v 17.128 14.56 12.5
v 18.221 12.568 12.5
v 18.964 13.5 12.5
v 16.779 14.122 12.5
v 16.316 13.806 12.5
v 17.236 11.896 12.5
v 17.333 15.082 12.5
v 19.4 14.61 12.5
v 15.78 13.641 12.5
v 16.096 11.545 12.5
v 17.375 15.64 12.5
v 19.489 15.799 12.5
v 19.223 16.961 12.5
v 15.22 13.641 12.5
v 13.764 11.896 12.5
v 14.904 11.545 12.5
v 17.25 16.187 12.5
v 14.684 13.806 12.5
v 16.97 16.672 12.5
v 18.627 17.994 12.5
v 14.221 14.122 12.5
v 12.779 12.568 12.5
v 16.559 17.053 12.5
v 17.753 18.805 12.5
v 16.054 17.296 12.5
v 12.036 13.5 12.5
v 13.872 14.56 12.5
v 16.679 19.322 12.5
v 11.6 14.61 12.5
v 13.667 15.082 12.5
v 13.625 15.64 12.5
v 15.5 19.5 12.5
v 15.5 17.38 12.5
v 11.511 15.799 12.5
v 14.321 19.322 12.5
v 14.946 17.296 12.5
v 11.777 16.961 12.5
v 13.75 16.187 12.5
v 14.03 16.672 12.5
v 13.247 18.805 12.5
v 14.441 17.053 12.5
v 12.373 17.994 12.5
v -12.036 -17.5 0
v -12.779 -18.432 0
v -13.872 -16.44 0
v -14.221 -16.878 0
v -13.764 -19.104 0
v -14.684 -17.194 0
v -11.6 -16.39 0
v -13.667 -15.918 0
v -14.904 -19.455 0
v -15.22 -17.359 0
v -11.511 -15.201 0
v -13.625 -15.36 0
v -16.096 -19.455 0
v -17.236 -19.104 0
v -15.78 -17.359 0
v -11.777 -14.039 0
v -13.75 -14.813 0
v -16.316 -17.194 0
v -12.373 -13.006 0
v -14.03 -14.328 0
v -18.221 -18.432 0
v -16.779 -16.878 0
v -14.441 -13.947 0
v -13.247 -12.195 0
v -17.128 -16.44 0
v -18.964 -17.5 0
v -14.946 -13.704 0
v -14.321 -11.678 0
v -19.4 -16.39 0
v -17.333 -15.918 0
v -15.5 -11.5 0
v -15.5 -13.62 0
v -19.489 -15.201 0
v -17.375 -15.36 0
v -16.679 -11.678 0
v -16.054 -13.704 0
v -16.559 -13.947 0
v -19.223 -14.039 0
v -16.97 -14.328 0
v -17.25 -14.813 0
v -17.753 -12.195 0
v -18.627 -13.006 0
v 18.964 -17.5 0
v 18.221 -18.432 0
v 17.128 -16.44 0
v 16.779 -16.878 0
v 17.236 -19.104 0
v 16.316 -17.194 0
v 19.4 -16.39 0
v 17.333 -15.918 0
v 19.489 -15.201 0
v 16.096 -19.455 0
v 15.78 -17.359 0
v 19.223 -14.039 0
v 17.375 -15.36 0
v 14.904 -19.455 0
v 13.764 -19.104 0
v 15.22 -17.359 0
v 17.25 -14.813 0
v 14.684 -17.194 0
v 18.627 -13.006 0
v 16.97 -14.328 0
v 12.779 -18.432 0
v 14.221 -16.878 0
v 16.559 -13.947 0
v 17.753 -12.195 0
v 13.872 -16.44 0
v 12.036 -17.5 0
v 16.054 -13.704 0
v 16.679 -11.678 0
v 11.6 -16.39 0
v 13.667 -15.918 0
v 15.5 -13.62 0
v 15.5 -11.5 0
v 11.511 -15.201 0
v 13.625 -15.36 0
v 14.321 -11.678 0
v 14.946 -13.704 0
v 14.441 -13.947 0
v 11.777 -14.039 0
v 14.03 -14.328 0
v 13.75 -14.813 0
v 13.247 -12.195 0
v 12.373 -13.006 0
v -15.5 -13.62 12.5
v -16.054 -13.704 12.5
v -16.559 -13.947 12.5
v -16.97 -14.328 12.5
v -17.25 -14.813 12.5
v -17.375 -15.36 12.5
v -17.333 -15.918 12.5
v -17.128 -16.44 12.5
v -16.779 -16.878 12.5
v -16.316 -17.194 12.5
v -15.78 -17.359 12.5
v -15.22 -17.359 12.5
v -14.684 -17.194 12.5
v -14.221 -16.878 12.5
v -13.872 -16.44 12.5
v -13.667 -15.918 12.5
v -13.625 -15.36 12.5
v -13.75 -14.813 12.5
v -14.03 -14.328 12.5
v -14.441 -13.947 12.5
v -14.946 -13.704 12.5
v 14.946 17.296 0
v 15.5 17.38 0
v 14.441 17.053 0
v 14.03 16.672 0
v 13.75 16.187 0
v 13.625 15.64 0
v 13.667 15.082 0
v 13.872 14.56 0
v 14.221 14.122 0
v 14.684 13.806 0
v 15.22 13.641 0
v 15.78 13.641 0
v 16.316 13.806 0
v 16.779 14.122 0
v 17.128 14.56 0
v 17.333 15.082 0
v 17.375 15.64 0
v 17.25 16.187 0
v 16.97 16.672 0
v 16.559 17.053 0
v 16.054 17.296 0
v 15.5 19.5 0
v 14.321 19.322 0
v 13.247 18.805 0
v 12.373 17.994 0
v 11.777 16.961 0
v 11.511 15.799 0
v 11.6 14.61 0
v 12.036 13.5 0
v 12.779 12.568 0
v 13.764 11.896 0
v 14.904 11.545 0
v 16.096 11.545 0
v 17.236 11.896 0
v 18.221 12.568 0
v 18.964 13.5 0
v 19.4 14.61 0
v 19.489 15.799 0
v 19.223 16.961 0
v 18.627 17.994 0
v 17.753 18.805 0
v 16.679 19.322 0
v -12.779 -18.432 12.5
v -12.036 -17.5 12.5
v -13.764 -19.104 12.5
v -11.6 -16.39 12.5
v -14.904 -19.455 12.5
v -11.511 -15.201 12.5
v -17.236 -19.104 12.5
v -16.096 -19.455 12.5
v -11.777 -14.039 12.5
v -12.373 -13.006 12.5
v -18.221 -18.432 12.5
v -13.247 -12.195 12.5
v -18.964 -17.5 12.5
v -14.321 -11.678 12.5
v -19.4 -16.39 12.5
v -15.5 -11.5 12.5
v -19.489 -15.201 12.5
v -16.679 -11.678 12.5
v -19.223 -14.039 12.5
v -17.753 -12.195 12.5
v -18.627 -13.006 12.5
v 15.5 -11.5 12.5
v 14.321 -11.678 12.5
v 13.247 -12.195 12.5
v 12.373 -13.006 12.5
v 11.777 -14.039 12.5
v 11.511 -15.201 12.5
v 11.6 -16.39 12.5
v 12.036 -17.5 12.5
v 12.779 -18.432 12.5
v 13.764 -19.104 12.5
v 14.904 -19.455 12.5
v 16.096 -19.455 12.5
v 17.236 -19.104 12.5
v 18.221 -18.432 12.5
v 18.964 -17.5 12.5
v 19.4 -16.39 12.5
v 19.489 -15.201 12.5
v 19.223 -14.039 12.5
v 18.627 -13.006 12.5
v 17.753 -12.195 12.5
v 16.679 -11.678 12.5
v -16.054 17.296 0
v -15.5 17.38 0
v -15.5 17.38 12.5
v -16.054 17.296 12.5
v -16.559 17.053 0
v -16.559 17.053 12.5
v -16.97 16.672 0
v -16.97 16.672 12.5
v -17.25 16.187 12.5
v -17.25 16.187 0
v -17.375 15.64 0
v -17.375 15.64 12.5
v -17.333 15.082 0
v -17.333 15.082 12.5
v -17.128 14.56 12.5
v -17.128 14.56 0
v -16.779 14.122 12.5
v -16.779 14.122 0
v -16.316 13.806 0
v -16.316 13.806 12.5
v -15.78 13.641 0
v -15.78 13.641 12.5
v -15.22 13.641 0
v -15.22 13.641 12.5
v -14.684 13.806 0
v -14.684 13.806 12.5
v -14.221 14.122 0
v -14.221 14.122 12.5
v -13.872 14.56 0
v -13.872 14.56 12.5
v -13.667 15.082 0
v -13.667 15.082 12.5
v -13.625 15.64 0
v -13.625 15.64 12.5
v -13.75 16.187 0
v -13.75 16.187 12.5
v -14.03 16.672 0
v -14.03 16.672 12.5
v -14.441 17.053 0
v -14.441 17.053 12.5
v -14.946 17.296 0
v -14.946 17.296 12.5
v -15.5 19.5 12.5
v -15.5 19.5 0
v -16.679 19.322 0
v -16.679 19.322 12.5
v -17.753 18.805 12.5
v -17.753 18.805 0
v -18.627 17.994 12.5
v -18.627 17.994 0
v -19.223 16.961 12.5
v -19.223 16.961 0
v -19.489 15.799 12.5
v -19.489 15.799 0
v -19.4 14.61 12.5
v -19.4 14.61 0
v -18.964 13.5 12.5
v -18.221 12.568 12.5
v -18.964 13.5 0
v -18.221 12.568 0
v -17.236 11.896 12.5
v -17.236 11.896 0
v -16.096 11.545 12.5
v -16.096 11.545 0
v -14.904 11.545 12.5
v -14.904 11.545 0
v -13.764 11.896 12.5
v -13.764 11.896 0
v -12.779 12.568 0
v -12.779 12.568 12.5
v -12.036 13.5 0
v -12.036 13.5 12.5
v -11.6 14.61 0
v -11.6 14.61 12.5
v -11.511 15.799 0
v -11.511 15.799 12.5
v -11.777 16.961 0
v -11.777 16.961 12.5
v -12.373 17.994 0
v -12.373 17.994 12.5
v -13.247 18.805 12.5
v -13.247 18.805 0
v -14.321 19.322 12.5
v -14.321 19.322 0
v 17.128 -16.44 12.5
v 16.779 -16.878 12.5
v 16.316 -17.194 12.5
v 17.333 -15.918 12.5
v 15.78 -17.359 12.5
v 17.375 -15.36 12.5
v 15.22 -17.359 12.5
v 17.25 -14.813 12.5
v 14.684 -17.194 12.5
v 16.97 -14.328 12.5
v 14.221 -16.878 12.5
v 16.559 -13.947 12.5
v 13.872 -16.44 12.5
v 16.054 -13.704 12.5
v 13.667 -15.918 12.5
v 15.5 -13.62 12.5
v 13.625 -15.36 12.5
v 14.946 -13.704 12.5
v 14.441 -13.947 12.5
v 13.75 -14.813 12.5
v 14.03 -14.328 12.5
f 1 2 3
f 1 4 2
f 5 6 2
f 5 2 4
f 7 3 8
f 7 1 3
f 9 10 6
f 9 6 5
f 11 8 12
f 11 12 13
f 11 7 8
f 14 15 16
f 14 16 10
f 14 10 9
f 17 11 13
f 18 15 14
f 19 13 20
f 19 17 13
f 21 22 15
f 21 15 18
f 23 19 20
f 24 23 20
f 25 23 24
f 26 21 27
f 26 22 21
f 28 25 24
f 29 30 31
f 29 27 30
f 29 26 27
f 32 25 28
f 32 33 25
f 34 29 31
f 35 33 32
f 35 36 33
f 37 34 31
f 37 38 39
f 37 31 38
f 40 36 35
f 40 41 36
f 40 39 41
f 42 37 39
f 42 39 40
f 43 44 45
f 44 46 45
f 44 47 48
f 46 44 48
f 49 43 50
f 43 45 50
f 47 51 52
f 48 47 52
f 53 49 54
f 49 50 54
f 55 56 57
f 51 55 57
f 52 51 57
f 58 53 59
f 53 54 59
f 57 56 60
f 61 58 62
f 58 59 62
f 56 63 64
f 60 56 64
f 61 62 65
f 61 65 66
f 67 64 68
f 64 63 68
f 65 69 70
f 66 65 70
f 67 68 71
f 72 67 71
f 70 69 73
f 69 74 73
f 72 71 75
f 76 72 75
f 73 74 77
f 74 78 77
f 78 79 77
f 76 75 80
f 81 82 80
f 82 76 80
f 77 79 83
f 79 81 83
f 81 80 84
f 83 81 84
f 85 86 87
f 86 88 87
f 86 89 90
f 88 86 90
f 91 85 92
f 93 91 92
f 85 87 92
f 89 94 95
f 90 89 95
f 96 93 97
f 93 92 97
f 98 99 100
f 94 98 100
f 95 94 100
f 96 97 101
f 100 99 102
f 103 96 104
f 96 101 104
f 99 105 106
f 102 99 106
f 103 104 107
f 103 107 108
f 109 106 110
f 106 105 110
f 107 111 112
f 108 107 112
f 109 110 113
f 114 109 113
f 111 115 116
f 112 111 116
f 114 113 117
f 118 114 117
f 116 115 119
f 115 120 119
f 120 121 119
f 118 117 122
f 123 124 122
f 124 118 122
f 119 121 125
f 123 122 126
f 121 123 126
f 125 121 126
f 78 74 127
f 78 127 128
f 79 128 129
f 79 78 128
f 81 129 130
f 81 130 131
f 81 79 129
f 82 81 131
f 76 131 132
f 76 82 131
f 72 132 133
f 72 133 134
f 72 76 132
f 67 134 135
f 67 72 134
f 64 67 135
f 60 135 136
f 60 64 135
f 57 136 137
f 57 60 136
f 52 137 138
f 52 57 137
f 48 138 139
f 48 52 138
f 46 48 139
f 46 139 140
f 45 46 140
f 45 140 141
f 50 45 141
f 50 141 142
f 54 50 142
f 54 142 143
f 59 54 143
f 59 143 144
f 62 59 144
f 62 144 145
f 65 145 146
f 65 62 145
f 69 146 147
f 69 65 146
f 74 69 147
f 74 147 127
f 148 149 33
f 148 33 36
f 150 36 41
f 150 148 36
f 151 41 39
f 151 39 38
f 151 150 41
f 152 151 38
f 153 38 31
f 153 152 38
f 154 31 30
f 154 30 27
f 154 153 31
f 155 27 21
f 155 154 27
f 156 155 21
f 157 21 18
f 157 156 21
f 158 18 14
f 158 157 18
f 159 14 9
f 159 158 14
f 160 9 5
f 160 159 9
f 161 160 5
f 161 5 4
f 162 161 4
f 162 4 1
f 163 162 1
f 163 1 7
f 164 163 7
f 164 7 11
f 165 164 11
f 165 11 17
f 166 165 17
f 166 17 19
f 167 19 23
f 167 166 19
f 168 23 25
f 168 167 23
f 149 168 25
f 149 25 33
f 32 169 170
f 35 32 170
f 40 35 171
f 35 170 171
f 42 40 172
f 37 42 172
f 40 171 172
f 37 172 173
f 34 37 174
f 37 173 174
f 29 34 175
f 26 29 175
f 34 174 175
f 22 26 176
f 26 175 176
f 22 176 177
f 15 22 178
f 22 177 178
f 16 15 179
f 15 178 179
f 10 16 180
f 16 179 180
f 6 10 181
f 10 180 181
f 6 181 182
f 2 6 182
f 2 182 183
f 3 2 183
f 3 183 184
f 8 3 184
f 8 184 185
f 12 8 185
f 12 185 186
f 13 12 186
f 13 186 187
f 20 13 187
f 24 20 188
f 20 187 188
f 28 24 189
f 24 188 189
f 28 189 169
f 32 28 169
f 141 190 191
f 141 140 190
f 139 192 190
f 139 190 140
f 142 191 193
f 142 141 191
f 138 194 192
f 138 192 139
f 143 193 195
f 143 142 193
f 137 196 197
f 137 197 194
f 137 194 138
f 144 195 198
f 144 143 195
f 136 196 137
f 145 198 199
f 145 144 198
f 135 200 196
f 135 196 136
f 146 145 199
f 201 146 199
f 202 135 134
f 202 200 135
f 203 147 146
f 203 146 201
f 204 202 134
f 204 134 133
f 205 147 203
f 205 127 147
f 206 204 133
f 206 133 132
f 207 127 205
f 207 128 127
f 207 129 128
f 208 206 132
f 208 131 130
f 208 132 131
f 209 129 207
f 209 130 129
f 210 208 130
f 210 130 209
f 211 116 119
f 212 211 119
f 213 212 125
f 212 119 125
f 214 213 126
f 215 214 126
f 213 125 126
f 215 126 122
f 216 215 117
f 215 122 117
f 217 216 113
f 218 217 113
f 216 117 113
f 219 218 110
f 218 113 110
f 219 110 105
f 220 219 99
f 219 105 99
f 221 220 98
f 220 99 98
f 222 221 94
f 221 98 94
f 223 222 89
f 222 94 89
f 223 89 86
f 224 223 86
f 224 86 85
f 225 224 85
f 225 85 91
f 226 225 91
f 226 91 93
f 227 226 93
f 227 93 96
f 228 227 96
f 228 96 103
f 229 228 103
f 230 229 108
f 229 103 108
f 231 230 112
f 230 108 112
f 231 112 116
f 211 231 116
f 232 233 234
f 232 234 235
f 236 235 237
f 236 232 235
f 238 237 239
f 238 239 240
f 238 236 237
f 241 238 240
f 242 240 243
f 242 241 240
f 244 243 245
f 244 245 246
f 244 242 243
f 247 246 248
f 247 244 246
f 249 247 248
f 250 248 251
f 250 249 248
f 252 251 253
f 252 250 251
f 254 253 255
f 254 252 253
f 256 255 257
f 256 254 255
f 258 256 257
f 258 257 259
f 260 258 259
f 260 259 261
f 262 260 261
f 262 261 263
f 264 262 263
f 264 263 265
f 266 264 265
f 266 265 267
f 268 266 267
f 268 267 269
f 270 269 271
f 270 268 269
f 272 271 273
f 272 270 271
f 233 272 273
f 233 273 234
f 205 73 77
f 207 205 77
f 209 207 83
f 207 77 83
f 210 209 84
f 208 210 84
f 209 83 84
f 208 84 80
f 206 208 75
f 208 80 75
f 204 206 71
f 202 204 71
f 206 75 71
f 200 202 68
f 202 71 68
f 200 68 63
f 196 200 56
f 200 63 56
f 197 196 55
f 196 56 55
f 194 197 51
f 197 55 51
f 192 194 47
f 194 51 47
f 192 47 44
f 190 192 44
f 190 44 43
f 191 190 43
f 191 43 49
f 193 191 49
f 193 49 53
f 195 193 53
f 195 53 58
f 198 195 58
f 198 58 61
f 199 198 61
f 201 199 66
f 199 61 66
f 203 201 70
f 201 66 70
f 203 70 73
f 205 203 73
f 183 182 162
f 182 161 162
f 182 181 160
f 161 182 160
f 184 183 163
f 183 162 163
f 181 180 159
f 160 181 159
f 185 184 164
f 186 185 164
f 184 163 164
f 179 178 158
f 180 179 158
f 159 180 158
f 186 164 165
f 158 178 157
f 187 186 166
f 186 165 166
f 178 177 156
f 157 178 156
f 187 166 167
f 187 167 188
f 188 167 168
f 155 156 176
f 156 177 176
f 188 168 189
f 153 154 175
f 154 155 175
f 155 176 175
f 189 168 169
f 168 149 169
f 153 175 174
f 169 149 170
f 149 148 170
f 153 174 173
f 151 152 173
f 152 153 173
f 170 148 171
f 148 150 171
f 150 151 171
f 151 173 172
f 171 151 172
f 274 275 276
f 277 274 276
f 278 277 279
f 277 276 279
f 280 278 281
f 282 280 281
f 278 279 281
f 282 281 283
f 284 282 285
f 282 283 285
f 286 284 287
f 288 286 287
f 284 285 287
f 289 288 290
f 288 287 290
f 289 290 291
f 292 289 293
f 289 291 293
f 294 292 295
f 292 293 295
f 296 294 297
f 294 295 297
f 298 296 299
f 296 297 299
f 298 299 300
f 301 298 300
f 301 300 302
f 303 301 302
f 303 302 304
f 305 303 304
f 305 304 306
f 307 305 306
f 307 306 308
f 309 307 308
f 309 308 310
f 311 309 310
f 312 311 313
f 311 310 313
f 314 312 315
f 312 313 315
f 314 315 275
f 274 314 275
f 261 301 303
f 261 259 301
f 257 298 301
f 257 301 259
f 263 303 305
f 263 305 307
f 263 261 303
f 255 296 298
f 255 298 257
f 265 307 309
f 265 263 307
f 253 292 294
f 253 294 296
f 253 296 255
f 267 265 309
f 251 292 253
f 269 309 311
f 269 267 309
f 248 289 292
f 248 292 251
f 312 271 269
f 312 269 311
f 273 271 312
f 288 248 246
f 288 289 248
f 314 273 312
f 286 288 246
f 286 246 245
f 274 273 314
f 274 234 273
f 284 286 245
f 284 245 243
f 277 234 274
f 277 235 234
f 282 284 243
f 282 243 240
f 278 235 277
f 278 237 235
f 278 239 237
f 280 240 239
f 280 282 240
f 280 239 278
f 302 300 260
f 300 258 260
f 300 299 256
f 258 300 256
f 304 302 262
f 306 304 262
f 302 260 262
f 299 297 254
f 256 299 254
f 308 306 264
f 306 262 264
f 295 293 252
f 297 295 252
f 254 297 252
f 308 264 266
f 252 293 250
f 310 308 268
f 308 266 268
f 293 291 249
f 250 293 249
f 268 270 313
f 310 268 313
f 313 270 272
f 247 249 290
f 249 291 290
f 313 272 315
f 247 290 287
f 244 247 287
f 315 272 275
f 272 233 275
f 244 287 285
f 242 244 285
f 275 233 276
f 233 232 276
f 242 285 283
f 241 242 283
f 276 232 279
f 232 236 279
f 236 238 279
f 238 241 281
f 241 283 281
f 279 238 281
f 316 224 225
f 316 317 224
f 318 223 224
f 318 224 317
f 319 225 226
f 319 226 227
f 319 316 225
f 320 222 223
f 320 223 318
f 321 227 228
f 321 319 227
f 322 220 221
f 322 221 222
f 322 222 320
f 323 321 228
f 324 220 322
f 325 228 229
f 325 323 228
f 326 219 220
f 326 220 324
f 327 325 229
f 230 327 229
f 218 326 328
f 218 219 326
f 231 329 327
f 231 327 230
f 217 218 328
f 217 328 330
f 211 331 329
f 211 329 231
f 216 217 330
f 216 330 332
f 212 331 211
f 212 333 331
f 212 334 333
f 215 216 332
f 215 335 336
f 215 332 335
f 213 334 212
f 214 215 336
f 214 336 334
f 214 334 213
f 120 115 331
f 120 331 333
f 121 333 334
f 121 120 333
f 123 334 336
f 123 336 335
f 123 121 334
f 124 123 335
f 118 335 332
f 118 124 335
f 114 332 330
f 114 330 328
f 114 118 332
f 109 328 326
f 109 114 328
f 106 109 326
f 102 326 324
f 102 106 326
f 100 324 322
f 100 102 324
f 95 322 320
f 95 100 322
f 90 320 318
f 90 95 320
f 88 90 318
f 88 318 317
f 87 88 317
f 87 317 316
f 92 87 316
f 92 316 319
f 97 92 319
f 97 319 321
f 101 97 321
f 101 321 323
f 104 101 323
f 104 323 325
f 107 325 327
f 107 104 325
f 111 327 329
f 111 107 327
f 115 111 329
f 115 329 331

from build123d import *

# Parameters (mm, degrees)
SKETCH_1_R        = 4
SKETCH_1_R_2      = 1.88
EXTRUDE_1_DEPTH   = 12.5
EXTRUDE_1_2_DEPTH = 12.5
EXTRUDE_1_3_DEPTH = 12.5
EXTRUDE_1_4_DEPTH = 12.5


with BuildPart() as part:
    # 草图1 → 凸台-拉伸1 (new body)
    with BuildSketch(Plane.XY):
        with Locations(Location((15.5, 15.5, 0), (0, 0, 90))):
            Circle(SKETCH_1_R)
        with Locations(Location((15.5, 15.5, 0), (0, 0, 90))):
            Circle(SKETCH_1_R_2, mode=Mode.SUBTRACT)
    extrude(amount=EXTRUDE_1_DEPTH)


with BuildPart() as body_2:
    # 草图1 → Extrude 1 2 (new body)
    with BuildSketch(Plane.XY):
        with Locations(Location((15.5, -15.5, 0), (0, 0, 90))):
            Circle(SKETCH_1_R)
        with Locations(Location((15.5, -15.5, 0), (0, 0, 90))):
            Circle(SKETCH_1_R_2, mode=Mode.SUBTRACT)
    extrude(amount=EXTRUDE_1_2_DEPTH)


with BuildPart() as body_3:
    # 草图1 → Extrude 1 3 (new body)
    with BuildSketch(Plane.XY):
        with Locations(Location((-15.5, -15.5, 0), (0, 0, 90))):
            Circle(SKETCH_1_R)
        with Locations(Location((-15.5, -15.5, 0), (0, 0, 90))):
            Circle(SKETCH_1_R_2, mode=Mode.SUBTRACT)
    extrude(amount=EXTRUDE_1_3_DEPTH)


with BuildPart() as body_4:
    # 草图1 → Extrude 1 4 (new body)
    with BuildSketch(Plane.XY):
        with Locations(Location((-15.5, 15.5, 0), (0, 0, 90))):
            Circle(SKETCH_1_R)
        with Locations(Location((-15.5, 15.5, 0), (0, 0, 90))):
            Circle(SKETCH_1_R_2, mode=Mode.SUBTRACT)
    extrude(amount=EXTRUDE_1_4_DEPTH)


solid = Compound([part.part, body_2.part, body_3.part, body_4.part])
